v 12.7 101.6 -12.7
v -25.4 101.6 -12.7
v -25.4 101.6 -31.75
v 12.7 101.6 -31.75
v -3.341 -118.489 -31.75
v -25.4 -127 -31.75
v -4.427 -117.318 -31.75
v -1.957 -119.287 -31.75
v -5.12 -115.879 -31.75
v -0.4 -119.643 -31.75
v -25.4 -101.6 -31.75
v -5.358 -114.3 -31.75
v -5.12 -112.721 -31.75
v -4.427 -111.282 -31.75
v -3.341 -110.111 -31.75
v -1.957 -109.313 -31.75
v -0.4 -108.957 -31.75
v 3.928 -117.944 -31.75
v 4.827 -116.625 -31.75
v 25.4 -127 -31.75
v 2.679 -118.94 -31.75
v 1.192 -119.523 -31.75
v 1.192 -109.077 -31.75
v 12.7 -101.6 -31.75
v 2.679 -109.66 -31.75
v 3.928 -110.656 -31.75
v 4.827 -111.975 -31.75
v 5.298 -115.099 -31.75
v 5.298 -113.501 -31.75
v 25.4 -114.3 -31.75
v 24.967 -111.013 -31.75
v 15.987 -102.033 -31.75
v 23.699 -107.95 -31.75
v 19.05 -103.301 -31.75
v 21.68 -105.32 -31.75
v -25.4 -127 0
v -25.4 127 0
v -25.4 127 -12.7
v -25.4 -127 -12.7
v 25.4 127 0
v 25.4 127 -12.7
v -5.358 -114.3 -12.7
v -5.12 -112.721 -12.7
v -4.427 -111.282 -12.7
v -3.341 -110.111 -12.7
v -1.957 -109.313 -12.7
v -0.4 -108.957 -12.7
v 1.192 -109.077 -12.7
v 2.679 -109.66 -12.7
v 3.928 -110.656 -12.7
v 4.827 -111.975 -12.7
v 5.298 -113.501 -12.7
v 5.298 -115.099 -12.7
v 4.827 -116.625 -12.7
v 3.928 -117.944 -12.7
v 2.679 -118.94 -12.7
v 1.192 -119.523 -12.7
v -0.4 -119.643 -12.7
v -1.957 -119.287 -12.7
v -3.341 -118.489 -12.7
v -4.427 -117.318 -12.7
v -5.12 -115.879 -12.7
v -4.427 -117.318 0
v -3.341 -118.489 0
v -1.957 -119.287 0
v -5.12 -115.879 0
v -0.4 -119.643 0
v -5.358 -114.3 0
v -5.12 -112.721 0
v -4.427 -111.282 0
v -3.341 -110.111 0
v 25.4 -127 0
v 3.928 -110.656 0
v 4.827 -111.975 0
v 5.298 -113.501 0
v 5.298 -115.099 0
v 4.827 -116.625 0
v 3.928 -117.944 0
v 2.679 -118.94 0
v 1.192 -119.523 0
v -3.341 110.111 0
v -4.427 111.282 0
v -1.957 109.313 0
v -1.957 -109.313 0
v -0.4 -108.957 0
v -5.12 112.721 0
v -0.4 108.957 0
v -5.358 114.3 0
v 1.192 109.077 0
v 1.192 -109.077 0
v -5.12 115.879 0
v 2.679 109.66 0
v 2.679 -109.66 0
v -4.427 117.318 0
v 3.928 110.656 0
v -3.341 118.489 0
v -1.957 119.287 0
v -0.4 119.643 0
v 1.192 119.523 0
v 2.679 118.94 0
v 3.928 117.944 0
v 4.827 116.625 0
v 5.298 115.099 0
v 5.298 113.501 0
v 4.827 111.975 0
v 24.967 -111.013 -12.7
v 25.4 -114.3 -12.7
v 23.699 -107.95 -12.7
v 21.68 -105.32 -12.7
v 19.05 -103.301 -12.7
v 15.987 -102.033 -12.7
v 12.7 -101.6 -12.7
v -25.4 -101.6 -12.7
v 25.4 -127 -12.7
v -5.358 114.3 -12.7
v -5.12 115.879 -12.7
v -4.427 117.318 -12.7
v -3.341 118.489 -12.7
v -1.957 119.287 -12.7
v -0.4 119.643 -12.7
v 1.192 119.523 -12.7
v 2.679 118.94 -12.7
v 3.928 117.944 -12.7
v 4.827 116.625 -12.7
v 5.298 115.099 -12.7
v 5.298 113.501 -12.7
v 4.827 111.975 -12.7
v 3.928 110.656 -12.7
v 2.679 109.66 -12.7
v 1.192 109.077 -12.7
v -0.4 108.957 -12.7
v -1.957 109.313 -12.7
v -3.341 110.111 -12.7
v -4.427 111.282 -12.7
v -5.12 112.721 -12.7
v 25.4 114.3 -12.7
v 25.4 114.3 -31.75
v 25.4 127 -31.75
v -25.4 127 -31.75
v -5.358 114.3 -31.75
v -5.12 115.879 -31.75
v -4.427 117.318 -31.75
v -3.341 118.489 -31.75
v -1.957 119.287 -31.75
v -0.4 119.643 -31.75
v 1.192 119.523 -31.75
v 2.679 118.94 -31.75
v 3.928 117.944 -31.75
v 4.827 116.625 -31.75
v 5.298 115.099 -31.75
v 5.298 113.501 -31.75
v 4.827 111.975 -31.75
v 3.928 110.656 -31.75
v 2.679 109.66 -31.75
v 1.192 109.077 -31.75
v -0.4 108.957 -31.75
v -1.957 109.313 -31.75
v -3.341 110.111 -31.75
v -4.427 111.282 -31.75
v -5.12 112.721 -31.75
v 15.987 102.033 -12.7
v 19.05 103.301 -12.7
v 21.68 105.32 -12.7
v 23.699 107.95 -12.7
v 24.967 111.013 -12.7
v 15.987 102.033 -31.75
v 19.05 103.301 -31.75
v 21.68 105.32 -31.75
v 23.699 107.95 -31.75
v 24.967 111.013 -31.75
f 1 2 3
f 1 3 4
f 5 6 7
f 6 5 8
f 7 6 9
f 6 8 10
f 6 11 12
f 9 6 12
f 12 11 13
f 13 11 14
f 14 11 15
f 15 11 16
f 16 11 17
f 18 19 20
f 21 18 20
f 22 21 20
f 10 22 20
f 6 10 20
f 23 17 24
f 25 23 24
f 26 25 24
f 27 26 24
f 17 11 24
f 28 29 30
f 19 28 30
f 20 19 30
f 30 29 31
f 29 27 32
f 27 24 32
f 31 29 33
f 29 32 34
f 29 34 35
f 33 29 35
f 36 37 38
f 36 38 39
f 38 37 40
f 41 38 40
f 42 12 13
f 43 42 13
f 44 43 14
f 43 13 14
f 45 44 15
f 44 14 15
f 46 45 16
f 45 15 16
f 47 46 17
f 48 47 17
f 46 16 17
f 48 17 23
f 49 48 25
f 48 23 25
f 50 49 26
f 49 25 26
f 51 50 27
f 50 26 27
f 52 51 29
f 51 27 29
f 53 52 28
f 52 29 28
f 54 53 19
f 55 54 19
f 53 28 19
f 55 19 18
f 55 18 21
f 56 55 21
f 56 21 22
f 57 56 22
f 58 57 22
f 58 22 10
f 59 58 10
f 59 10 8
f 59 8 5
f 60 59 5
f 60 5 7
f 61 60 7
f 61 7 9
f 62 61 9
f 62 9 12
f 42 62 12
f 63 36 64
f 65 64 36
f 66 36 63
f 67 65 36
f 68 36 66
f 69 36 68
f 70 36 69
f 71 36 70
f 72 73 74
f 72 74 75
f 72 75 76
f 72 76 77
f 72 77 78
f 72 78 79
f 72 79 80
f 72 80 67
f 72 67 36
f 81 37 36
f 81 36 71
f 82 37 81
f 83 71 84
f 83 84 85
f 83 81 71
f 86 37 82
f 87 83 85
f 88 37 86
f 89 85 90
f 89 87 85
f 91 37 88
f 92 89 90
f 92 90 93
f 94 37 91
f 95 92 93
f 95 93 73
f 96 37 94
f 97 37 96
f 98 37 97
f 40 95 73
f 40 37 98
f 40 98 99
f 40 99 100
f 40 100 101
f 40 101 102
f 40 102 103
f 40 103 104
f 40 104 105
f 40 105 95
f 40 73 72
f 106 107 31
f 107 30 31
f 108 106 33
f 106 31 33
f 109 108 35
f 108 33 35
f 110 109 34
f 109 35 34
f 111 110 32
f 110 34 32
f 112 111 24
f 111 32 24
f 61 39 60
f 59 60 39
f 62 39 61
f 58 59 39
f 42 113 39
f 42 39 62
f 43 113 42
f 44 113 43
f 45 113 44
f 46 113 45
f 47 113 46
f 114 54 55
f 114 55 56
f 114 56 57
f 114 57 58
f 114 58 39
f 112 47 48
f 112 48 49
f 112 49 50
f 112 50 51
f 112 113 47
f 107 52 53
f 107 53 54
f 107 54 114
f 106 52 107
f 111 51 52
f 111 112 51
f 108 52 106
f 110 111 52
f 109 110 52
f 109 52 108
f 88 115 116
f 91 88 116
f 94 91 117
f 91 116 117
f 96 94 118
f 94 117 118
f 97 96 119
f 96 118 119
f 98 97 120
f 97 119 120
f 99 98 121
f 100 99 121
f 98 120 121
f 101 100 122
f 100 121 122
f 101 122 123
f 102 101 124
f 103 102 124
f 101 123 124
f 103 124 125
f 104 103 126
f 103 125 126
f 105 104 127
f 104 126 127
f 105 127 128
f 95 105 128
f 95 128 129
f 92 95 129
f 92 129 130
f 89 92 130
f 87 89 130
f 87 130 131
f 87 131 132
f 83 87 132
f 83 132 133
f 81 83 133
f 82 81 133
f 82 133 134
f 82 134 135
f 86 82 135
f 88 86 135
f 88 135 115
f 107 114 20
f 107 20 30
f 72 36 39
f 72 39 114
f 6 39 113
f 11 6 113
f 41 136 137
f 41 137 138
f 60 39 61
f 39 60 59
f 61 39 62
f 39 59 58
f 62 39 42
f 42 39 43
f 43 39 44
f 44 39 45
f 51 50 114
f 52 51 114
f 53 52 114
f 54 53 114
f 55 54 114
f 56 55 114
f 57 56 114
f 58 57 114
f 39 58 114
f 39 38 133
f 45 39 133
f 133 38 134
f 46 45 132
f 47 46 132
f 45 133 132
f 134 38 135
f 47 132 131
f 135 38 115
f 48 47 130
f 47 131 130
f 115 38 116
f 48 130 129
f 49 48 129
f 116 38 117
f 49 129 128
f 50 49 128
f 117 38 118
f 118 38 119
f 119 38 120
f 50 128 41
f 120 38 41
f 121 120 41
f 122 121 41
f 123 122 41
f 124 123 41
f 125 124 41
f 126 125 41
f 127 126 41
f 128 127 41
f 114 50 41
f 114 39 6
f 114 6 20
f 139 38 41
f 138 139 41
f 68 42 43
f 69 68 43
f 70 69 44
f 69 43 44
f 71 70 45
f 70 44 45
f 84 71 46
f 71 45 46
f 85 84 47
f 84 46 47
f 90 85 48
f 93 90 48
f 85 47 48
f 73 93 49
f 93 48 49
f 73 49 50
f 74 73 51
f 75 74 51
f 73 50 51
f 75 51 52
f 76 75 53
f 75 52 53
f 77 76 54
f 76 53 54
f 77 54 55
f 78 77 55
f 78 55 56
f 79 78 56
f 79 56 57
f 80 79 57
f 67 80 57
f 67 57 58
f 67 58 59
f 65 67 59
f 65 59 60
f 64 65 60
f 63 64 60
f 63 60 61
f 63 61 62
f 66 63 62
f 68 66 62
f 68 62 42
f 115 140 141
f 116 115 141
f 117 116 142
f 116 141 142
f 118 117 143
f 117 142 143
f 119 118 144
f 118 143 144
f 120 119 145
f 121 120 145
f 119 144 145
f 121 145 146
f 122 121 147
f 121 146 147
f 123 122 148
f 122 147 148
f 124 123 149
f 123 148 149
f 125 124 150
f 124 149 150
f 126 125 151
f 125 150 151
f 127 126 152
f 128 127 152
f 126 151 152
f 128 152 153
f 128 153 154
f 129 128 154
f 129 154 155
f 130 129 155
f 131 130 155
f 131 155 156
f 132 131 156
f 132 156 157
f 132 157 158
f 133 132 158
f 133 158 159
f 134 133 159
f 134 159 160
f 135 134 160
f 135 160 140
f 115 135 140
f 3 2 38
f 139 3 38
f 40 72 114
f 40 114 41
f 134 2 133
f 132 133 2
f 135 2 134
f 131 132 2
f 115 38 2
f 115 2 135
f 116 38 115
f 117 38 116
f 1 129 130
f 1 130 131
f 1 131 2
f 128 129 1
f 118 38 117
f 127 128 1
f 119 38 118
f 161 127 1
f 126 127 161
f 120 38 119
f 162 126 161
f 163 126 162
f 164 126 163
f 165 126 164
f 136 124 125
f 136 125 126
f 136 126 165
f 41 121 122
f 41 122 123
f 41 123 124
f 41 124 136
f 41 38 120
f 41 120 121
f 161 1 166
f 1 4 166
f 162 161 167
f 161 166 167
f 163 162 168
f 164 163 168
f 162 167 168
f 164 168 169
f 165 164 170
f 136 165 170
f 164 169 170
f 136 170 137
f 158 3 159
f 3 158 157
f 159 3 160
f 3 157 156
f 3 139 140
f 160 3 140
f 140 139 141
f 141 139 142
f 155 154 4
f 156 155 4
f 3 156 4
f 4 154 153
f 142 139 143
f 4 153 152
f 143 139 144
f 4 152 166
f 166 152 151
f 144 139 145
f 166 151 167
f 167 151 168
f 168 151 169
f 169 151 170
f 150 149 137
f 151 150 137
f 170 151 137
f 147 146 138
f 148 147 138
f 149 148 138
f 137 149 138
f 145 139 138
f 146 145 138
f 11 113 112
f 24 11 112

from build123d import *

# Parameters (mm, degrees)
F1_START = -12.7
F0_W     = 50.8
F0_H     = 25.4
F1_DEPTH = 19.05
F0_H_2   = 203.2
F2_DEPTH = 12.7
F4_R     = 12.7
F4_2_R   = 12.7
F5_D     = 10.715625
F5_2_D   = 10.715625
F5_3_D   = 10.715625


with BuildPart() as f1:
    # F0 (on Top) → F1 (new body)
    with BuildSketch(Plane.XY.offset(F1_START)):
        with Locations((0, 114.3)):
            Rectangle(F0_W, F0_H)
    extrude(amount=-F1_DEPTH)

    # F4#2
    f4_2_edges = [f1.edges().sort_by_distance(p)[0] for p in [
        (25.4, 101.6, -22.225),
    ]]
    fillet(f4_2_edges, radius=F4_2_R)

    # F5 (through all)
    with Locations(Plane.XY):
        with Locations((0, 114.3), (0, -114.3)):
            Hole(F5_D / 2)


with BuildPart() as f1b:
    # F0 (on Top) → F1, piece 2 (new body)
    with BuildSketch(Plane.XY.offset(F1_START)):
        with Locations((0, -114.3)):
            Rectangle(F0_W, F0_H)
    extrude(amount=-F1_DEPTH)

    # F4
    f4_edges = [f1b.edges().sort_by_distance(p)[0] for p in [
        (25.4, -101.6, -22.225),
    ]]
    fillet(f4_edges, radius=F4_R)

    # F5#2 (through all)
    with Locations(Plane.XY):
        with Locations((0, 114.3), (0, -114.3)):
            Hole(F5_2_D / 2)


with BuildPart() as f2:
    # F0 (on Top) → F2 (new body)
    with BuildSketch(Plane.XY):
        Rectangle(F0_W, F0_H_2)
        with Locations((0, 114.3)):
            Rectangle(F0_W, F0_H)
        with Locations((0, -114.3)):
            Rectangle(F0_W, F0_H)
    extrude(amount=-F2_DEPTH)

    # F5#3 (through all)
    with Locations(Plane.XY):
        with Locations((0, 114.3), (0, -114.3)):
            Hole(F5_3_D / 2)


solid = Compound([f1.part, f1b.part, f2.part])
